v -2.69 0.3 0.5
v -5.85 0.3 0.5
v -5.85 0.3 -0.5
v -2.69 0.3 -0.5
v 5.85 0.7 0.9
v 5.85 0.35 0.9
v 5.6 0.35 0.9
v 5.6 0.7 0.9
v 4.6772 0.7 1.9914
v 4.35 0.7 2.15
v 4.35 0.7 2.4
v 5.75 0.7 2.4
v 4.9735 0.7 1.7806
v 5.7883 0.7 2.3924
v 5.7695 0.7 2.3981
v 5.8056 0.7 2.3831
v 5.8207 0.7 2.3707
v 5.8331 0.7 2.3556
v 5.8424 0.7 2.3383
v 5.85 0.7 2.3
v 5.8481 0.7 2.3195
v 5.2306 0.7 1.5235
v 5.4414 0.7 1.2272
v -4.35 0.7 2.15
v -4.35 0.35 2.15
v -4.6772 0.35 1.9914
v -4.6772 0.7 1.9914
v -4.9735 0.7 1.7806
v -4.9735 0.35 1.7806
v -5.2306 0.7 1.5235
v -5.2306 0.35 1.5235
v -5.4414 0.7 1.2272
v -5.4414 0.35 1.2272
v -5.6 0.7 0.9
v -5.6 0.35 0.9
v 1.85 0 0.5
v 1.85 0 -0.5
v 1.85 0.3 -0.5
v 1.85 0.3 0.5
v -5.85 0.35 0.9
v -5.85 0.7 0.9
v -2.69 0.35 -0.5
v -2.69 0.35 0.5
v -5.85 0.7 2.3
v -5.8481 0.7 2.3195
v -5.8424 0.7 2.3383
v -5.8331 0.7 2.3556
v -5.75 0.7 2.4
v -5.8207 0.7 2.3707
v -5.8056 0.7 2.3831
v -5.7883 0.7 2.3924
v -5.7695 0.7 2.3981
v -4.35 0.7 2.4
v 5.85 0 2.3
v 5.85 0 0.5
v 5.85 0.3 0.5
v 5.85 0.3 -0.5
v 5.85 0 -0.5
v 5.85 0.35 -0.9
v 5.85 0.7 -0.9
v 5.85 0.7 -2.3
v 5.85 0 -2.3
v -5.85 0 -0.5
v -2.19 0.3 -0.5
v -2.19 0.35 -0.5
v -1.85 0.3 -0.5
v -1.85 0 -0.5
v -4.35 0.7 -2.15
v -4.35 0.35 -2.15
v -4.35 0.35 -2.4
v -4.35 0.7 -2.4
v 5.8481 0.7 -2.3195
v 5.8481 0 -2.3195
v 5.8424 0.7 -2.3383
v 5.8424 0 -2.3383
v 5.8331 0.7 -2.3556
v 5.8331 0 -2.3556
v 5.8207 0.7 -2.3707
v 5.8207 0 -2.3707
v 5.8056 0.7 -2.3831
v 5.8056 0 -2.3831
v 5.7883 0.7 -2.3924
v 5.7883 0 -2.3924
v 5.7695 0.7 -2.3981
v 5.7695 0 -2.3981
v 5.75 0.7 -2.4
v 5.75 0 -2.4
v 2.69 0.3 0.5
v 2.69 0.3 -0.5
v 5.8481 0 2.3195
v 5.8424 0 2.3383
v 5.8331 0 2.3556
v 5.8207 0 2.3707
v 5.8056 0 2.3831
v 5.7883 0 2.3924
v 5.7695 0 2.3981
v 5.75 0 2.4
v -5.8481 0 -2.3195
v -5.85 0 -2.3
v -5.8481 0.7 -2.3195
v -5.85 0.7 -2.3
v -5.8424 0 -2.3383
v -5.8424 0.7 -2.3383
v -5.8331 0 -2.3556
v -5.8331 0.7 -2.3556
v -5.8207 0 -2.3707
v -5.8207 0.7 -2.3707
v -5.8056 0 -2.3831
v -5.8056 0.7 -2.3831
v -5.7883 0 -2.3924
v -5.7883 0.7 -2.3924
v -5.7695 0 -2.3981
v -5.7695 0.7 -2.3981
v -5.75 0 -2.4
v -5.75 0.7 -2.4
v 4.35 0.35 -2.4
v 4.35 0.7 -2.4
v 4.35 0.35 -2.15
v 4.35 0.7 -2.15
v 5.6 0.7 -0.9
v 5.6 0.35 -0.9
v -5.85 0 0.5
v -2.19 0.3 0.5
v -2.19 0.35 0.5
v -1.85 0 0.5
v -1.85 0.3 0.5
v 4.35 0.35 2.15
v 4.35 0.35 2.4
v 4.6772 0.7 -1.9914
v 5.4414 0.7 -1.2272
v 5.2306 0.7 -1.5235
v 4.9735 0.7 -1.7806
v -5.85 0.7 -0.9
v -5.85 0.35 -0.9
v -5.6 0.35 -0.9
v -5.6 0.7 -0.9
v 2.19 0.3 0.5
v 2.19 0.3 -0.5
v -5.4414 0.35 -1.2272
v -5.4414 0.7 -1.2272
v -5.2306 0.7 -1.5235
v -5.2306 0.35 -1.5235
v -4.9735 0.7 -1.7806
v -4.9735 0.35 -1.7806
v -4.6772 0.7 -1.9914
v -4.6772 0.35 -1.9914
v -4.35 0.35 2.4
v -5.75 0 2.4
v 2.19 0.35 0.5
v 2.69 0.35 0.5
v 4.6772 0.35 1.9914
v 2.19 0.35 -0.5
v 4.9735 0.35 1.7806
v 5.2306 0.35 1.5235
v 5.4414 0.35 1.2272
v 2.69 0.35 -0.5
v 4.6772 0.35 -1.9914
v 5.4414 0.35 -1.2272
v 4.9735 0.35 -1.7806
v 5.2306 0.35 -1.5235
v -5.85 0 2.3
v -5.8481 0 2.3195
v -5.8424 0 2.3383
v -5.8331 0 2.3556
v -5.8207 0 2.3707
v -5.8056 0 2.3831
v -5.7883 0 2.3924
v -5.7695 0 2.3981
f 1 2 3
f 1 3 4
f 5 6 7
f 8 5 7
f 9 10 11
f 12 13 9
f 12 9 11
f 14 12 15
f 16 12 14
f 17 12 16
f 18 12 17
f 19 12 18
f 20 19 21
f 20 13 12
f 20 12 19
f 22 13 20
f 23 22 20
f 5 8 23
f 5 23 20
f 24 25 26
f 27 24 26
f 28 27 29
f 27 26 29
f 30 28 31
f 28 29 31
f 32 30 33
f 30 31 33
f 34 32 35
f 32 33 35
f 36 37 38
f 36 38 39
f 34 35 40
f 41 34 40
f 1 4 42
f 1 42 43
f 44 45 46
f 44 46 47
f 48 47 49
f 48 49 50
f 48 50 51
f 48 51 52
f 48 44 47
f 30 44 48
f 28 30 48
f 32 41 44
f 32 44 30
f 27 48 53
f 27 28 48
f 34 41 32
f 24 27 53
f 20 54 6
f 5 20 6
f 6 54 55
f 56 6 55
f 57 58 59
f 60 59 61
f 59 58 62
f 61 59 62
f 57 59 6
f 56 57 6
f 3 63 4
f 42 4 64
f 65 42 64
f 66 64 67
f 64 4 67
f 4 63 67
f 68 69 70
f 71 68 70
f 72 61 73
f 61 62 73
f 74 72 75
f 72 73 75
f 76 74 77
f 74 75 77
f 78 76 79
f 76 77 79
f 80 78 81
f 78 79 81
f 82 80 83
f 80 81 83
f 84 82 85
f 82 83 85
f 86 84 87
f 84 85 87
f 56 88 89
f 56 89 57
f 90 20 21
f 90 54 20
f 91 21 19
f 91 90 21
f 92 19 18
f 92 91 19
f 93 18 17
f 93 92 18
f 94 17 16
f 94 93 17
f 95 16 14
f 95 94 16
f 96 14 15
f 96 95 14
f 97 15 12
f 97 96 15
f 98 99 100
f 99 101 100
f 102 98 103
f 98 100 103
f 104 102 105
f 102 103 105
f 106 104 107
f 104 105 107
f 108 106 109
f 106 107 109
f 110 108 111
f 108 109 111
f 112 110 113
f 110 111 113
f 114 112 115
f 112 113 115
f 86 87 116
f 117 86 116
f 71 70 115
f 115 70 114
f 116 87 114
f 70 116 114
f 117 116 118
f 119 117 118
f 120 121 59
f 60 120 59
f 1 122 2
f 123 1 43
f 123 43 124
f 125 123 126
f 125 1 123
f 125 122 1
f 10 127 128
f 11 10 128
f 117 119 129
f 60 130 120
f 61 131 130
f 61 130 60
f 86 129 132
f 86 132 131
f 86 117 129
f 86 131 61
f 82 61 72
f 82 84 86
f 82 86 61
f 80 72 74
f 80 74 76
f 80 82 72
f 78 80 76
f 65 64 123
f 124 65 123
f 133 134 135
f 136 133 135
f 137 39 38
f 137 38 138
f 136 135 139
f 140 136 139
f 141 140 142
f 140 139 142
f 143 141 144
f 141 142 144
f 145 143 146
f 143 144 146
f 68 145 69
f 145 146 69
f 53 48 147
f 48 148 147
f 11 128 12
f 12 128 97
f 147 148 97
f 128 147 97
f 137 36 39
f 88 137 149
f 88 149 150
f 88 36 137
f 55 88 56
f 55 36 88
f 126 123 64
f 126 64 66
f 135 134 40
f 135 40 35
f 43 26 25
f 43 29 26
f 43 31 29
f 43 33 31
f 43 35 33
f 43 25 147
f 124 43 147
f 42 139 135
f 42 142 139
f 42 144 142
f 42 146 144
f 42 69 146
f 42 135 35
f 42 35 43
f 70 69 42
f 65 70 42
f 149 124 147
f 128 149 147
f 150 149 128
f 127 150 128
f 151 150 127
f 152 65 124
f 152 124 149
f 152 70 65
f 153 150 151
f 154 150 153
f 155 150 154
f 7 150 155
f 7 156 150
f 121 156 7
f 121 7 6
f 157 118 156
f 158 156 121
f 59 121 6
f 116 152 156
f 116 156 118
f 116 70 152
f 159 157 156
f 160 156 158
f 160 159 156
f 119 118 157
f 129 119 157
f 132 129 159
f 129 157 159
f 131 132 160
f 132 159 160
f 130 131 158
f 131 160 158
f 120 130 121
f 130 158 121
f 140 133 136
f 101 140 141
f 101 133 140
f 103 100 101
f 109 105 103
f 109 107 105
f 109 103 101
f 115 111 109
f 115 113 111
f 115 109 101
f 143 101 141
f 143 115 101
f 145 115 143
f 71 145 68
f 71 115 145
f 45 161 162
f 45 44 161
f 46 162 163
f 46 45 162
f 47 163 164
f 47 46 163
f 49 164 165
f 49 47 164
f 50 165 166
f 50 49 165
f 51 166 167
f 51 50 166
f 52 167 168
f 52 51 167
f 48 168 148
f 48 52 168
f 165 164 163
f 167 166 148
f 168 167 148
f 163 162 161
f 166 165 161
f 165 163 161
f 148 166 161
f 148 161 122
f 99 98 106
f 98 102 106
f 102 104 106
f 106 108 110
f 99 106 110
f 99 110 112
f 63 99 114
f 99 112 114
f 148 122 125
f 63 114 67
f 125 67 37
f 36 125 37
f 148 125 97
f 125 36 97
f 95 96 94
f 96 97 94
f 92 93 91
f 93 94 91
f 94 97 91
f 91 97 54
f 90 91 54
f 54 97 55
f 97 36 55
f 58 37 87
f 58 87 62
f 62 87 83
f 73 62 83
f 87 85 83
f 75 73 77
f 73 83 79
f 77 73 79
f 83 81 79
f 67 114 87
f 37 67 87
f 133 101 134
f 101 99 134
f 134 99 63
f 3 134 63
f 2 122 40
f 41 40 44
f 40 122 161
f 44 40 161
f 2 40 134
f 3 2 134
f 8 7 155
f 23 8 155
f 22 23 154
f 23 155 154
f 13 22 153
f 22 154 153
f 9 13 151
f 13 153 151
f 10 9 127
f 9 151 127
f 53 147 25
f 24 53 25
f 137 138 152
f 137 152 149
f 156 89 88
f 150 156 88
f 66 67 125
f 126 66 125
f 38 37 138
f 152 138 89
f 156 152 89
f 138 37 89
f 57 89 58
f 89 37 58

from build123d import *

# Parameters (mm, degrees)
SKETCH1_W           = 11.7
SKETCH1_H           = 4.8
BOSS_EXTRUDE1_DEPTH = 0.35
SKETCH2_W           = 4
SKETCH2_H           = 1
CUT_EXTRUDE2_DEPTH  = 0.3
BOSS_EXTRUDE3_DEPTH = 0.35
FILLET2_R           = 0.1
SKETCH6_W           = 0.5
SKETCH6_H           = 1
CUT_EXTRUDE3_DEPTH  = 1


with BuildPart() as part:
    # Sketch1 → Boss-Extrude1 (new body)
    with BuildSketch(Plane(origin=(0, 0, 0), x_dir=(1, 0, 0), z_dir=(0, 1, 0))):
        Rectangle(SKETCH1_W, SKETCH1_H)
    extrude(amount=BOSS_EXTRUDE1_DEPTH)

    # Sketch2 → Cut-Extrude2 (cut)
    with BuildSketch(Plane.XZ):
        with Locations((-3.85, 0)):
            Rectangle(SKETCH2_W, SKETCH2_H)
        with Locations((3.85, 0)):
            Rectangle(SKETCH2_W, SKETCH2_H)
    extrude(amount=-CUT_EXTRUDE2_DEPTH, mode=Mode.SUBTRACT)

    # Sketch4 → Boss-Extrude3 (add)
    with BuildSketch(Plane(origin=(0, 0.35, 0), x_dir=(1, 0, 0), z_dir=(0, 1, 0))):
        with BuildLine():
            Line((-4.35, 2.15), (-4.35, 2.4))
            Line((-4.35, 2.4), (-5.85, 2.4))
            Line((-5.85, 2.4), (-5.85, 0.9))
            Line((-5.85, 0.9), (-5.6, 0.9))
            ThreePointArc((-5.6, 0.9), (-5.107388458, 1.657388458), (-4.35, 2.15))
        make_face()
        with BuildLine():
            Line((5.85, 2.4), (4.35, 2.4))
            Line((4.35, 2.4), (4.35, 2.15))
            ThreePointArc((4.35, 2.15), (5.107388458, 1.657388458), (5.6, 0.9))
            Line((5.6, 0.9), (5.85, 0.9))
            Line((5.85, 0.9), (5.85, 2.4))
        make_face()
        with BuildLine():
            Line((4.35, -2.15), (4.35, -2.4))
            Line((4.35, -2.4), (5.85, -2.4))
            Line((5.85, -2.4), (5.85, -0.9))
            Line((5.85, -0.9), (5.6, -0.9))
            ThreePointArc((5.6, -0.9), (5.107388458, -1.657388458), (4.35, -2.15))
        make_face()
        with BuildLine():
            Line((-5.85, -2.4), (-4.35, -2.4))
            Line((-4.35, -2.4), (-4.35, -2.15))
            ThreePointArc((-4.35, -2.15), (-5.107388458, -1.657388458), (-5.6, -0.9))
            Line((-5.6, -0.9), (-5.85, -0.9))
            Line((-5.85, -0.9), (-5.85, -2.4))
        make_face()
    extrude(amount=BOSS_EXTRUDE3_DEPTH)

    # Fillet2
    fillet2_edges = [part.edges().sort_by_distance(p)[0] for p in [
        (5.85, 0.35, 2.4),
        (-5.85, 0.35, 2.4),
        (-5.85, 0.35, -2.4),
        (5.85, 0.35, -2.4),
    ]]
    fillet(fillet2_edges, radius=FILLET2_R)

    # Sketch6 → Cut-Extrude3 (cut)
    with BuildSketch(Plane.XZ.offset(-0.3)):
        with Locations((2.44, 0)):
            Rectangle(SKETCH6_W, SKETCH6_H)
        with Locations((-2.44, 0)):
            Rectangle(SKETCH6_W, SKETCH6_H)
    extrude(amount=-CUT_EXTRUDE3_DEPTH, mode=Mode.SUBTRACT)


solid = part.part
